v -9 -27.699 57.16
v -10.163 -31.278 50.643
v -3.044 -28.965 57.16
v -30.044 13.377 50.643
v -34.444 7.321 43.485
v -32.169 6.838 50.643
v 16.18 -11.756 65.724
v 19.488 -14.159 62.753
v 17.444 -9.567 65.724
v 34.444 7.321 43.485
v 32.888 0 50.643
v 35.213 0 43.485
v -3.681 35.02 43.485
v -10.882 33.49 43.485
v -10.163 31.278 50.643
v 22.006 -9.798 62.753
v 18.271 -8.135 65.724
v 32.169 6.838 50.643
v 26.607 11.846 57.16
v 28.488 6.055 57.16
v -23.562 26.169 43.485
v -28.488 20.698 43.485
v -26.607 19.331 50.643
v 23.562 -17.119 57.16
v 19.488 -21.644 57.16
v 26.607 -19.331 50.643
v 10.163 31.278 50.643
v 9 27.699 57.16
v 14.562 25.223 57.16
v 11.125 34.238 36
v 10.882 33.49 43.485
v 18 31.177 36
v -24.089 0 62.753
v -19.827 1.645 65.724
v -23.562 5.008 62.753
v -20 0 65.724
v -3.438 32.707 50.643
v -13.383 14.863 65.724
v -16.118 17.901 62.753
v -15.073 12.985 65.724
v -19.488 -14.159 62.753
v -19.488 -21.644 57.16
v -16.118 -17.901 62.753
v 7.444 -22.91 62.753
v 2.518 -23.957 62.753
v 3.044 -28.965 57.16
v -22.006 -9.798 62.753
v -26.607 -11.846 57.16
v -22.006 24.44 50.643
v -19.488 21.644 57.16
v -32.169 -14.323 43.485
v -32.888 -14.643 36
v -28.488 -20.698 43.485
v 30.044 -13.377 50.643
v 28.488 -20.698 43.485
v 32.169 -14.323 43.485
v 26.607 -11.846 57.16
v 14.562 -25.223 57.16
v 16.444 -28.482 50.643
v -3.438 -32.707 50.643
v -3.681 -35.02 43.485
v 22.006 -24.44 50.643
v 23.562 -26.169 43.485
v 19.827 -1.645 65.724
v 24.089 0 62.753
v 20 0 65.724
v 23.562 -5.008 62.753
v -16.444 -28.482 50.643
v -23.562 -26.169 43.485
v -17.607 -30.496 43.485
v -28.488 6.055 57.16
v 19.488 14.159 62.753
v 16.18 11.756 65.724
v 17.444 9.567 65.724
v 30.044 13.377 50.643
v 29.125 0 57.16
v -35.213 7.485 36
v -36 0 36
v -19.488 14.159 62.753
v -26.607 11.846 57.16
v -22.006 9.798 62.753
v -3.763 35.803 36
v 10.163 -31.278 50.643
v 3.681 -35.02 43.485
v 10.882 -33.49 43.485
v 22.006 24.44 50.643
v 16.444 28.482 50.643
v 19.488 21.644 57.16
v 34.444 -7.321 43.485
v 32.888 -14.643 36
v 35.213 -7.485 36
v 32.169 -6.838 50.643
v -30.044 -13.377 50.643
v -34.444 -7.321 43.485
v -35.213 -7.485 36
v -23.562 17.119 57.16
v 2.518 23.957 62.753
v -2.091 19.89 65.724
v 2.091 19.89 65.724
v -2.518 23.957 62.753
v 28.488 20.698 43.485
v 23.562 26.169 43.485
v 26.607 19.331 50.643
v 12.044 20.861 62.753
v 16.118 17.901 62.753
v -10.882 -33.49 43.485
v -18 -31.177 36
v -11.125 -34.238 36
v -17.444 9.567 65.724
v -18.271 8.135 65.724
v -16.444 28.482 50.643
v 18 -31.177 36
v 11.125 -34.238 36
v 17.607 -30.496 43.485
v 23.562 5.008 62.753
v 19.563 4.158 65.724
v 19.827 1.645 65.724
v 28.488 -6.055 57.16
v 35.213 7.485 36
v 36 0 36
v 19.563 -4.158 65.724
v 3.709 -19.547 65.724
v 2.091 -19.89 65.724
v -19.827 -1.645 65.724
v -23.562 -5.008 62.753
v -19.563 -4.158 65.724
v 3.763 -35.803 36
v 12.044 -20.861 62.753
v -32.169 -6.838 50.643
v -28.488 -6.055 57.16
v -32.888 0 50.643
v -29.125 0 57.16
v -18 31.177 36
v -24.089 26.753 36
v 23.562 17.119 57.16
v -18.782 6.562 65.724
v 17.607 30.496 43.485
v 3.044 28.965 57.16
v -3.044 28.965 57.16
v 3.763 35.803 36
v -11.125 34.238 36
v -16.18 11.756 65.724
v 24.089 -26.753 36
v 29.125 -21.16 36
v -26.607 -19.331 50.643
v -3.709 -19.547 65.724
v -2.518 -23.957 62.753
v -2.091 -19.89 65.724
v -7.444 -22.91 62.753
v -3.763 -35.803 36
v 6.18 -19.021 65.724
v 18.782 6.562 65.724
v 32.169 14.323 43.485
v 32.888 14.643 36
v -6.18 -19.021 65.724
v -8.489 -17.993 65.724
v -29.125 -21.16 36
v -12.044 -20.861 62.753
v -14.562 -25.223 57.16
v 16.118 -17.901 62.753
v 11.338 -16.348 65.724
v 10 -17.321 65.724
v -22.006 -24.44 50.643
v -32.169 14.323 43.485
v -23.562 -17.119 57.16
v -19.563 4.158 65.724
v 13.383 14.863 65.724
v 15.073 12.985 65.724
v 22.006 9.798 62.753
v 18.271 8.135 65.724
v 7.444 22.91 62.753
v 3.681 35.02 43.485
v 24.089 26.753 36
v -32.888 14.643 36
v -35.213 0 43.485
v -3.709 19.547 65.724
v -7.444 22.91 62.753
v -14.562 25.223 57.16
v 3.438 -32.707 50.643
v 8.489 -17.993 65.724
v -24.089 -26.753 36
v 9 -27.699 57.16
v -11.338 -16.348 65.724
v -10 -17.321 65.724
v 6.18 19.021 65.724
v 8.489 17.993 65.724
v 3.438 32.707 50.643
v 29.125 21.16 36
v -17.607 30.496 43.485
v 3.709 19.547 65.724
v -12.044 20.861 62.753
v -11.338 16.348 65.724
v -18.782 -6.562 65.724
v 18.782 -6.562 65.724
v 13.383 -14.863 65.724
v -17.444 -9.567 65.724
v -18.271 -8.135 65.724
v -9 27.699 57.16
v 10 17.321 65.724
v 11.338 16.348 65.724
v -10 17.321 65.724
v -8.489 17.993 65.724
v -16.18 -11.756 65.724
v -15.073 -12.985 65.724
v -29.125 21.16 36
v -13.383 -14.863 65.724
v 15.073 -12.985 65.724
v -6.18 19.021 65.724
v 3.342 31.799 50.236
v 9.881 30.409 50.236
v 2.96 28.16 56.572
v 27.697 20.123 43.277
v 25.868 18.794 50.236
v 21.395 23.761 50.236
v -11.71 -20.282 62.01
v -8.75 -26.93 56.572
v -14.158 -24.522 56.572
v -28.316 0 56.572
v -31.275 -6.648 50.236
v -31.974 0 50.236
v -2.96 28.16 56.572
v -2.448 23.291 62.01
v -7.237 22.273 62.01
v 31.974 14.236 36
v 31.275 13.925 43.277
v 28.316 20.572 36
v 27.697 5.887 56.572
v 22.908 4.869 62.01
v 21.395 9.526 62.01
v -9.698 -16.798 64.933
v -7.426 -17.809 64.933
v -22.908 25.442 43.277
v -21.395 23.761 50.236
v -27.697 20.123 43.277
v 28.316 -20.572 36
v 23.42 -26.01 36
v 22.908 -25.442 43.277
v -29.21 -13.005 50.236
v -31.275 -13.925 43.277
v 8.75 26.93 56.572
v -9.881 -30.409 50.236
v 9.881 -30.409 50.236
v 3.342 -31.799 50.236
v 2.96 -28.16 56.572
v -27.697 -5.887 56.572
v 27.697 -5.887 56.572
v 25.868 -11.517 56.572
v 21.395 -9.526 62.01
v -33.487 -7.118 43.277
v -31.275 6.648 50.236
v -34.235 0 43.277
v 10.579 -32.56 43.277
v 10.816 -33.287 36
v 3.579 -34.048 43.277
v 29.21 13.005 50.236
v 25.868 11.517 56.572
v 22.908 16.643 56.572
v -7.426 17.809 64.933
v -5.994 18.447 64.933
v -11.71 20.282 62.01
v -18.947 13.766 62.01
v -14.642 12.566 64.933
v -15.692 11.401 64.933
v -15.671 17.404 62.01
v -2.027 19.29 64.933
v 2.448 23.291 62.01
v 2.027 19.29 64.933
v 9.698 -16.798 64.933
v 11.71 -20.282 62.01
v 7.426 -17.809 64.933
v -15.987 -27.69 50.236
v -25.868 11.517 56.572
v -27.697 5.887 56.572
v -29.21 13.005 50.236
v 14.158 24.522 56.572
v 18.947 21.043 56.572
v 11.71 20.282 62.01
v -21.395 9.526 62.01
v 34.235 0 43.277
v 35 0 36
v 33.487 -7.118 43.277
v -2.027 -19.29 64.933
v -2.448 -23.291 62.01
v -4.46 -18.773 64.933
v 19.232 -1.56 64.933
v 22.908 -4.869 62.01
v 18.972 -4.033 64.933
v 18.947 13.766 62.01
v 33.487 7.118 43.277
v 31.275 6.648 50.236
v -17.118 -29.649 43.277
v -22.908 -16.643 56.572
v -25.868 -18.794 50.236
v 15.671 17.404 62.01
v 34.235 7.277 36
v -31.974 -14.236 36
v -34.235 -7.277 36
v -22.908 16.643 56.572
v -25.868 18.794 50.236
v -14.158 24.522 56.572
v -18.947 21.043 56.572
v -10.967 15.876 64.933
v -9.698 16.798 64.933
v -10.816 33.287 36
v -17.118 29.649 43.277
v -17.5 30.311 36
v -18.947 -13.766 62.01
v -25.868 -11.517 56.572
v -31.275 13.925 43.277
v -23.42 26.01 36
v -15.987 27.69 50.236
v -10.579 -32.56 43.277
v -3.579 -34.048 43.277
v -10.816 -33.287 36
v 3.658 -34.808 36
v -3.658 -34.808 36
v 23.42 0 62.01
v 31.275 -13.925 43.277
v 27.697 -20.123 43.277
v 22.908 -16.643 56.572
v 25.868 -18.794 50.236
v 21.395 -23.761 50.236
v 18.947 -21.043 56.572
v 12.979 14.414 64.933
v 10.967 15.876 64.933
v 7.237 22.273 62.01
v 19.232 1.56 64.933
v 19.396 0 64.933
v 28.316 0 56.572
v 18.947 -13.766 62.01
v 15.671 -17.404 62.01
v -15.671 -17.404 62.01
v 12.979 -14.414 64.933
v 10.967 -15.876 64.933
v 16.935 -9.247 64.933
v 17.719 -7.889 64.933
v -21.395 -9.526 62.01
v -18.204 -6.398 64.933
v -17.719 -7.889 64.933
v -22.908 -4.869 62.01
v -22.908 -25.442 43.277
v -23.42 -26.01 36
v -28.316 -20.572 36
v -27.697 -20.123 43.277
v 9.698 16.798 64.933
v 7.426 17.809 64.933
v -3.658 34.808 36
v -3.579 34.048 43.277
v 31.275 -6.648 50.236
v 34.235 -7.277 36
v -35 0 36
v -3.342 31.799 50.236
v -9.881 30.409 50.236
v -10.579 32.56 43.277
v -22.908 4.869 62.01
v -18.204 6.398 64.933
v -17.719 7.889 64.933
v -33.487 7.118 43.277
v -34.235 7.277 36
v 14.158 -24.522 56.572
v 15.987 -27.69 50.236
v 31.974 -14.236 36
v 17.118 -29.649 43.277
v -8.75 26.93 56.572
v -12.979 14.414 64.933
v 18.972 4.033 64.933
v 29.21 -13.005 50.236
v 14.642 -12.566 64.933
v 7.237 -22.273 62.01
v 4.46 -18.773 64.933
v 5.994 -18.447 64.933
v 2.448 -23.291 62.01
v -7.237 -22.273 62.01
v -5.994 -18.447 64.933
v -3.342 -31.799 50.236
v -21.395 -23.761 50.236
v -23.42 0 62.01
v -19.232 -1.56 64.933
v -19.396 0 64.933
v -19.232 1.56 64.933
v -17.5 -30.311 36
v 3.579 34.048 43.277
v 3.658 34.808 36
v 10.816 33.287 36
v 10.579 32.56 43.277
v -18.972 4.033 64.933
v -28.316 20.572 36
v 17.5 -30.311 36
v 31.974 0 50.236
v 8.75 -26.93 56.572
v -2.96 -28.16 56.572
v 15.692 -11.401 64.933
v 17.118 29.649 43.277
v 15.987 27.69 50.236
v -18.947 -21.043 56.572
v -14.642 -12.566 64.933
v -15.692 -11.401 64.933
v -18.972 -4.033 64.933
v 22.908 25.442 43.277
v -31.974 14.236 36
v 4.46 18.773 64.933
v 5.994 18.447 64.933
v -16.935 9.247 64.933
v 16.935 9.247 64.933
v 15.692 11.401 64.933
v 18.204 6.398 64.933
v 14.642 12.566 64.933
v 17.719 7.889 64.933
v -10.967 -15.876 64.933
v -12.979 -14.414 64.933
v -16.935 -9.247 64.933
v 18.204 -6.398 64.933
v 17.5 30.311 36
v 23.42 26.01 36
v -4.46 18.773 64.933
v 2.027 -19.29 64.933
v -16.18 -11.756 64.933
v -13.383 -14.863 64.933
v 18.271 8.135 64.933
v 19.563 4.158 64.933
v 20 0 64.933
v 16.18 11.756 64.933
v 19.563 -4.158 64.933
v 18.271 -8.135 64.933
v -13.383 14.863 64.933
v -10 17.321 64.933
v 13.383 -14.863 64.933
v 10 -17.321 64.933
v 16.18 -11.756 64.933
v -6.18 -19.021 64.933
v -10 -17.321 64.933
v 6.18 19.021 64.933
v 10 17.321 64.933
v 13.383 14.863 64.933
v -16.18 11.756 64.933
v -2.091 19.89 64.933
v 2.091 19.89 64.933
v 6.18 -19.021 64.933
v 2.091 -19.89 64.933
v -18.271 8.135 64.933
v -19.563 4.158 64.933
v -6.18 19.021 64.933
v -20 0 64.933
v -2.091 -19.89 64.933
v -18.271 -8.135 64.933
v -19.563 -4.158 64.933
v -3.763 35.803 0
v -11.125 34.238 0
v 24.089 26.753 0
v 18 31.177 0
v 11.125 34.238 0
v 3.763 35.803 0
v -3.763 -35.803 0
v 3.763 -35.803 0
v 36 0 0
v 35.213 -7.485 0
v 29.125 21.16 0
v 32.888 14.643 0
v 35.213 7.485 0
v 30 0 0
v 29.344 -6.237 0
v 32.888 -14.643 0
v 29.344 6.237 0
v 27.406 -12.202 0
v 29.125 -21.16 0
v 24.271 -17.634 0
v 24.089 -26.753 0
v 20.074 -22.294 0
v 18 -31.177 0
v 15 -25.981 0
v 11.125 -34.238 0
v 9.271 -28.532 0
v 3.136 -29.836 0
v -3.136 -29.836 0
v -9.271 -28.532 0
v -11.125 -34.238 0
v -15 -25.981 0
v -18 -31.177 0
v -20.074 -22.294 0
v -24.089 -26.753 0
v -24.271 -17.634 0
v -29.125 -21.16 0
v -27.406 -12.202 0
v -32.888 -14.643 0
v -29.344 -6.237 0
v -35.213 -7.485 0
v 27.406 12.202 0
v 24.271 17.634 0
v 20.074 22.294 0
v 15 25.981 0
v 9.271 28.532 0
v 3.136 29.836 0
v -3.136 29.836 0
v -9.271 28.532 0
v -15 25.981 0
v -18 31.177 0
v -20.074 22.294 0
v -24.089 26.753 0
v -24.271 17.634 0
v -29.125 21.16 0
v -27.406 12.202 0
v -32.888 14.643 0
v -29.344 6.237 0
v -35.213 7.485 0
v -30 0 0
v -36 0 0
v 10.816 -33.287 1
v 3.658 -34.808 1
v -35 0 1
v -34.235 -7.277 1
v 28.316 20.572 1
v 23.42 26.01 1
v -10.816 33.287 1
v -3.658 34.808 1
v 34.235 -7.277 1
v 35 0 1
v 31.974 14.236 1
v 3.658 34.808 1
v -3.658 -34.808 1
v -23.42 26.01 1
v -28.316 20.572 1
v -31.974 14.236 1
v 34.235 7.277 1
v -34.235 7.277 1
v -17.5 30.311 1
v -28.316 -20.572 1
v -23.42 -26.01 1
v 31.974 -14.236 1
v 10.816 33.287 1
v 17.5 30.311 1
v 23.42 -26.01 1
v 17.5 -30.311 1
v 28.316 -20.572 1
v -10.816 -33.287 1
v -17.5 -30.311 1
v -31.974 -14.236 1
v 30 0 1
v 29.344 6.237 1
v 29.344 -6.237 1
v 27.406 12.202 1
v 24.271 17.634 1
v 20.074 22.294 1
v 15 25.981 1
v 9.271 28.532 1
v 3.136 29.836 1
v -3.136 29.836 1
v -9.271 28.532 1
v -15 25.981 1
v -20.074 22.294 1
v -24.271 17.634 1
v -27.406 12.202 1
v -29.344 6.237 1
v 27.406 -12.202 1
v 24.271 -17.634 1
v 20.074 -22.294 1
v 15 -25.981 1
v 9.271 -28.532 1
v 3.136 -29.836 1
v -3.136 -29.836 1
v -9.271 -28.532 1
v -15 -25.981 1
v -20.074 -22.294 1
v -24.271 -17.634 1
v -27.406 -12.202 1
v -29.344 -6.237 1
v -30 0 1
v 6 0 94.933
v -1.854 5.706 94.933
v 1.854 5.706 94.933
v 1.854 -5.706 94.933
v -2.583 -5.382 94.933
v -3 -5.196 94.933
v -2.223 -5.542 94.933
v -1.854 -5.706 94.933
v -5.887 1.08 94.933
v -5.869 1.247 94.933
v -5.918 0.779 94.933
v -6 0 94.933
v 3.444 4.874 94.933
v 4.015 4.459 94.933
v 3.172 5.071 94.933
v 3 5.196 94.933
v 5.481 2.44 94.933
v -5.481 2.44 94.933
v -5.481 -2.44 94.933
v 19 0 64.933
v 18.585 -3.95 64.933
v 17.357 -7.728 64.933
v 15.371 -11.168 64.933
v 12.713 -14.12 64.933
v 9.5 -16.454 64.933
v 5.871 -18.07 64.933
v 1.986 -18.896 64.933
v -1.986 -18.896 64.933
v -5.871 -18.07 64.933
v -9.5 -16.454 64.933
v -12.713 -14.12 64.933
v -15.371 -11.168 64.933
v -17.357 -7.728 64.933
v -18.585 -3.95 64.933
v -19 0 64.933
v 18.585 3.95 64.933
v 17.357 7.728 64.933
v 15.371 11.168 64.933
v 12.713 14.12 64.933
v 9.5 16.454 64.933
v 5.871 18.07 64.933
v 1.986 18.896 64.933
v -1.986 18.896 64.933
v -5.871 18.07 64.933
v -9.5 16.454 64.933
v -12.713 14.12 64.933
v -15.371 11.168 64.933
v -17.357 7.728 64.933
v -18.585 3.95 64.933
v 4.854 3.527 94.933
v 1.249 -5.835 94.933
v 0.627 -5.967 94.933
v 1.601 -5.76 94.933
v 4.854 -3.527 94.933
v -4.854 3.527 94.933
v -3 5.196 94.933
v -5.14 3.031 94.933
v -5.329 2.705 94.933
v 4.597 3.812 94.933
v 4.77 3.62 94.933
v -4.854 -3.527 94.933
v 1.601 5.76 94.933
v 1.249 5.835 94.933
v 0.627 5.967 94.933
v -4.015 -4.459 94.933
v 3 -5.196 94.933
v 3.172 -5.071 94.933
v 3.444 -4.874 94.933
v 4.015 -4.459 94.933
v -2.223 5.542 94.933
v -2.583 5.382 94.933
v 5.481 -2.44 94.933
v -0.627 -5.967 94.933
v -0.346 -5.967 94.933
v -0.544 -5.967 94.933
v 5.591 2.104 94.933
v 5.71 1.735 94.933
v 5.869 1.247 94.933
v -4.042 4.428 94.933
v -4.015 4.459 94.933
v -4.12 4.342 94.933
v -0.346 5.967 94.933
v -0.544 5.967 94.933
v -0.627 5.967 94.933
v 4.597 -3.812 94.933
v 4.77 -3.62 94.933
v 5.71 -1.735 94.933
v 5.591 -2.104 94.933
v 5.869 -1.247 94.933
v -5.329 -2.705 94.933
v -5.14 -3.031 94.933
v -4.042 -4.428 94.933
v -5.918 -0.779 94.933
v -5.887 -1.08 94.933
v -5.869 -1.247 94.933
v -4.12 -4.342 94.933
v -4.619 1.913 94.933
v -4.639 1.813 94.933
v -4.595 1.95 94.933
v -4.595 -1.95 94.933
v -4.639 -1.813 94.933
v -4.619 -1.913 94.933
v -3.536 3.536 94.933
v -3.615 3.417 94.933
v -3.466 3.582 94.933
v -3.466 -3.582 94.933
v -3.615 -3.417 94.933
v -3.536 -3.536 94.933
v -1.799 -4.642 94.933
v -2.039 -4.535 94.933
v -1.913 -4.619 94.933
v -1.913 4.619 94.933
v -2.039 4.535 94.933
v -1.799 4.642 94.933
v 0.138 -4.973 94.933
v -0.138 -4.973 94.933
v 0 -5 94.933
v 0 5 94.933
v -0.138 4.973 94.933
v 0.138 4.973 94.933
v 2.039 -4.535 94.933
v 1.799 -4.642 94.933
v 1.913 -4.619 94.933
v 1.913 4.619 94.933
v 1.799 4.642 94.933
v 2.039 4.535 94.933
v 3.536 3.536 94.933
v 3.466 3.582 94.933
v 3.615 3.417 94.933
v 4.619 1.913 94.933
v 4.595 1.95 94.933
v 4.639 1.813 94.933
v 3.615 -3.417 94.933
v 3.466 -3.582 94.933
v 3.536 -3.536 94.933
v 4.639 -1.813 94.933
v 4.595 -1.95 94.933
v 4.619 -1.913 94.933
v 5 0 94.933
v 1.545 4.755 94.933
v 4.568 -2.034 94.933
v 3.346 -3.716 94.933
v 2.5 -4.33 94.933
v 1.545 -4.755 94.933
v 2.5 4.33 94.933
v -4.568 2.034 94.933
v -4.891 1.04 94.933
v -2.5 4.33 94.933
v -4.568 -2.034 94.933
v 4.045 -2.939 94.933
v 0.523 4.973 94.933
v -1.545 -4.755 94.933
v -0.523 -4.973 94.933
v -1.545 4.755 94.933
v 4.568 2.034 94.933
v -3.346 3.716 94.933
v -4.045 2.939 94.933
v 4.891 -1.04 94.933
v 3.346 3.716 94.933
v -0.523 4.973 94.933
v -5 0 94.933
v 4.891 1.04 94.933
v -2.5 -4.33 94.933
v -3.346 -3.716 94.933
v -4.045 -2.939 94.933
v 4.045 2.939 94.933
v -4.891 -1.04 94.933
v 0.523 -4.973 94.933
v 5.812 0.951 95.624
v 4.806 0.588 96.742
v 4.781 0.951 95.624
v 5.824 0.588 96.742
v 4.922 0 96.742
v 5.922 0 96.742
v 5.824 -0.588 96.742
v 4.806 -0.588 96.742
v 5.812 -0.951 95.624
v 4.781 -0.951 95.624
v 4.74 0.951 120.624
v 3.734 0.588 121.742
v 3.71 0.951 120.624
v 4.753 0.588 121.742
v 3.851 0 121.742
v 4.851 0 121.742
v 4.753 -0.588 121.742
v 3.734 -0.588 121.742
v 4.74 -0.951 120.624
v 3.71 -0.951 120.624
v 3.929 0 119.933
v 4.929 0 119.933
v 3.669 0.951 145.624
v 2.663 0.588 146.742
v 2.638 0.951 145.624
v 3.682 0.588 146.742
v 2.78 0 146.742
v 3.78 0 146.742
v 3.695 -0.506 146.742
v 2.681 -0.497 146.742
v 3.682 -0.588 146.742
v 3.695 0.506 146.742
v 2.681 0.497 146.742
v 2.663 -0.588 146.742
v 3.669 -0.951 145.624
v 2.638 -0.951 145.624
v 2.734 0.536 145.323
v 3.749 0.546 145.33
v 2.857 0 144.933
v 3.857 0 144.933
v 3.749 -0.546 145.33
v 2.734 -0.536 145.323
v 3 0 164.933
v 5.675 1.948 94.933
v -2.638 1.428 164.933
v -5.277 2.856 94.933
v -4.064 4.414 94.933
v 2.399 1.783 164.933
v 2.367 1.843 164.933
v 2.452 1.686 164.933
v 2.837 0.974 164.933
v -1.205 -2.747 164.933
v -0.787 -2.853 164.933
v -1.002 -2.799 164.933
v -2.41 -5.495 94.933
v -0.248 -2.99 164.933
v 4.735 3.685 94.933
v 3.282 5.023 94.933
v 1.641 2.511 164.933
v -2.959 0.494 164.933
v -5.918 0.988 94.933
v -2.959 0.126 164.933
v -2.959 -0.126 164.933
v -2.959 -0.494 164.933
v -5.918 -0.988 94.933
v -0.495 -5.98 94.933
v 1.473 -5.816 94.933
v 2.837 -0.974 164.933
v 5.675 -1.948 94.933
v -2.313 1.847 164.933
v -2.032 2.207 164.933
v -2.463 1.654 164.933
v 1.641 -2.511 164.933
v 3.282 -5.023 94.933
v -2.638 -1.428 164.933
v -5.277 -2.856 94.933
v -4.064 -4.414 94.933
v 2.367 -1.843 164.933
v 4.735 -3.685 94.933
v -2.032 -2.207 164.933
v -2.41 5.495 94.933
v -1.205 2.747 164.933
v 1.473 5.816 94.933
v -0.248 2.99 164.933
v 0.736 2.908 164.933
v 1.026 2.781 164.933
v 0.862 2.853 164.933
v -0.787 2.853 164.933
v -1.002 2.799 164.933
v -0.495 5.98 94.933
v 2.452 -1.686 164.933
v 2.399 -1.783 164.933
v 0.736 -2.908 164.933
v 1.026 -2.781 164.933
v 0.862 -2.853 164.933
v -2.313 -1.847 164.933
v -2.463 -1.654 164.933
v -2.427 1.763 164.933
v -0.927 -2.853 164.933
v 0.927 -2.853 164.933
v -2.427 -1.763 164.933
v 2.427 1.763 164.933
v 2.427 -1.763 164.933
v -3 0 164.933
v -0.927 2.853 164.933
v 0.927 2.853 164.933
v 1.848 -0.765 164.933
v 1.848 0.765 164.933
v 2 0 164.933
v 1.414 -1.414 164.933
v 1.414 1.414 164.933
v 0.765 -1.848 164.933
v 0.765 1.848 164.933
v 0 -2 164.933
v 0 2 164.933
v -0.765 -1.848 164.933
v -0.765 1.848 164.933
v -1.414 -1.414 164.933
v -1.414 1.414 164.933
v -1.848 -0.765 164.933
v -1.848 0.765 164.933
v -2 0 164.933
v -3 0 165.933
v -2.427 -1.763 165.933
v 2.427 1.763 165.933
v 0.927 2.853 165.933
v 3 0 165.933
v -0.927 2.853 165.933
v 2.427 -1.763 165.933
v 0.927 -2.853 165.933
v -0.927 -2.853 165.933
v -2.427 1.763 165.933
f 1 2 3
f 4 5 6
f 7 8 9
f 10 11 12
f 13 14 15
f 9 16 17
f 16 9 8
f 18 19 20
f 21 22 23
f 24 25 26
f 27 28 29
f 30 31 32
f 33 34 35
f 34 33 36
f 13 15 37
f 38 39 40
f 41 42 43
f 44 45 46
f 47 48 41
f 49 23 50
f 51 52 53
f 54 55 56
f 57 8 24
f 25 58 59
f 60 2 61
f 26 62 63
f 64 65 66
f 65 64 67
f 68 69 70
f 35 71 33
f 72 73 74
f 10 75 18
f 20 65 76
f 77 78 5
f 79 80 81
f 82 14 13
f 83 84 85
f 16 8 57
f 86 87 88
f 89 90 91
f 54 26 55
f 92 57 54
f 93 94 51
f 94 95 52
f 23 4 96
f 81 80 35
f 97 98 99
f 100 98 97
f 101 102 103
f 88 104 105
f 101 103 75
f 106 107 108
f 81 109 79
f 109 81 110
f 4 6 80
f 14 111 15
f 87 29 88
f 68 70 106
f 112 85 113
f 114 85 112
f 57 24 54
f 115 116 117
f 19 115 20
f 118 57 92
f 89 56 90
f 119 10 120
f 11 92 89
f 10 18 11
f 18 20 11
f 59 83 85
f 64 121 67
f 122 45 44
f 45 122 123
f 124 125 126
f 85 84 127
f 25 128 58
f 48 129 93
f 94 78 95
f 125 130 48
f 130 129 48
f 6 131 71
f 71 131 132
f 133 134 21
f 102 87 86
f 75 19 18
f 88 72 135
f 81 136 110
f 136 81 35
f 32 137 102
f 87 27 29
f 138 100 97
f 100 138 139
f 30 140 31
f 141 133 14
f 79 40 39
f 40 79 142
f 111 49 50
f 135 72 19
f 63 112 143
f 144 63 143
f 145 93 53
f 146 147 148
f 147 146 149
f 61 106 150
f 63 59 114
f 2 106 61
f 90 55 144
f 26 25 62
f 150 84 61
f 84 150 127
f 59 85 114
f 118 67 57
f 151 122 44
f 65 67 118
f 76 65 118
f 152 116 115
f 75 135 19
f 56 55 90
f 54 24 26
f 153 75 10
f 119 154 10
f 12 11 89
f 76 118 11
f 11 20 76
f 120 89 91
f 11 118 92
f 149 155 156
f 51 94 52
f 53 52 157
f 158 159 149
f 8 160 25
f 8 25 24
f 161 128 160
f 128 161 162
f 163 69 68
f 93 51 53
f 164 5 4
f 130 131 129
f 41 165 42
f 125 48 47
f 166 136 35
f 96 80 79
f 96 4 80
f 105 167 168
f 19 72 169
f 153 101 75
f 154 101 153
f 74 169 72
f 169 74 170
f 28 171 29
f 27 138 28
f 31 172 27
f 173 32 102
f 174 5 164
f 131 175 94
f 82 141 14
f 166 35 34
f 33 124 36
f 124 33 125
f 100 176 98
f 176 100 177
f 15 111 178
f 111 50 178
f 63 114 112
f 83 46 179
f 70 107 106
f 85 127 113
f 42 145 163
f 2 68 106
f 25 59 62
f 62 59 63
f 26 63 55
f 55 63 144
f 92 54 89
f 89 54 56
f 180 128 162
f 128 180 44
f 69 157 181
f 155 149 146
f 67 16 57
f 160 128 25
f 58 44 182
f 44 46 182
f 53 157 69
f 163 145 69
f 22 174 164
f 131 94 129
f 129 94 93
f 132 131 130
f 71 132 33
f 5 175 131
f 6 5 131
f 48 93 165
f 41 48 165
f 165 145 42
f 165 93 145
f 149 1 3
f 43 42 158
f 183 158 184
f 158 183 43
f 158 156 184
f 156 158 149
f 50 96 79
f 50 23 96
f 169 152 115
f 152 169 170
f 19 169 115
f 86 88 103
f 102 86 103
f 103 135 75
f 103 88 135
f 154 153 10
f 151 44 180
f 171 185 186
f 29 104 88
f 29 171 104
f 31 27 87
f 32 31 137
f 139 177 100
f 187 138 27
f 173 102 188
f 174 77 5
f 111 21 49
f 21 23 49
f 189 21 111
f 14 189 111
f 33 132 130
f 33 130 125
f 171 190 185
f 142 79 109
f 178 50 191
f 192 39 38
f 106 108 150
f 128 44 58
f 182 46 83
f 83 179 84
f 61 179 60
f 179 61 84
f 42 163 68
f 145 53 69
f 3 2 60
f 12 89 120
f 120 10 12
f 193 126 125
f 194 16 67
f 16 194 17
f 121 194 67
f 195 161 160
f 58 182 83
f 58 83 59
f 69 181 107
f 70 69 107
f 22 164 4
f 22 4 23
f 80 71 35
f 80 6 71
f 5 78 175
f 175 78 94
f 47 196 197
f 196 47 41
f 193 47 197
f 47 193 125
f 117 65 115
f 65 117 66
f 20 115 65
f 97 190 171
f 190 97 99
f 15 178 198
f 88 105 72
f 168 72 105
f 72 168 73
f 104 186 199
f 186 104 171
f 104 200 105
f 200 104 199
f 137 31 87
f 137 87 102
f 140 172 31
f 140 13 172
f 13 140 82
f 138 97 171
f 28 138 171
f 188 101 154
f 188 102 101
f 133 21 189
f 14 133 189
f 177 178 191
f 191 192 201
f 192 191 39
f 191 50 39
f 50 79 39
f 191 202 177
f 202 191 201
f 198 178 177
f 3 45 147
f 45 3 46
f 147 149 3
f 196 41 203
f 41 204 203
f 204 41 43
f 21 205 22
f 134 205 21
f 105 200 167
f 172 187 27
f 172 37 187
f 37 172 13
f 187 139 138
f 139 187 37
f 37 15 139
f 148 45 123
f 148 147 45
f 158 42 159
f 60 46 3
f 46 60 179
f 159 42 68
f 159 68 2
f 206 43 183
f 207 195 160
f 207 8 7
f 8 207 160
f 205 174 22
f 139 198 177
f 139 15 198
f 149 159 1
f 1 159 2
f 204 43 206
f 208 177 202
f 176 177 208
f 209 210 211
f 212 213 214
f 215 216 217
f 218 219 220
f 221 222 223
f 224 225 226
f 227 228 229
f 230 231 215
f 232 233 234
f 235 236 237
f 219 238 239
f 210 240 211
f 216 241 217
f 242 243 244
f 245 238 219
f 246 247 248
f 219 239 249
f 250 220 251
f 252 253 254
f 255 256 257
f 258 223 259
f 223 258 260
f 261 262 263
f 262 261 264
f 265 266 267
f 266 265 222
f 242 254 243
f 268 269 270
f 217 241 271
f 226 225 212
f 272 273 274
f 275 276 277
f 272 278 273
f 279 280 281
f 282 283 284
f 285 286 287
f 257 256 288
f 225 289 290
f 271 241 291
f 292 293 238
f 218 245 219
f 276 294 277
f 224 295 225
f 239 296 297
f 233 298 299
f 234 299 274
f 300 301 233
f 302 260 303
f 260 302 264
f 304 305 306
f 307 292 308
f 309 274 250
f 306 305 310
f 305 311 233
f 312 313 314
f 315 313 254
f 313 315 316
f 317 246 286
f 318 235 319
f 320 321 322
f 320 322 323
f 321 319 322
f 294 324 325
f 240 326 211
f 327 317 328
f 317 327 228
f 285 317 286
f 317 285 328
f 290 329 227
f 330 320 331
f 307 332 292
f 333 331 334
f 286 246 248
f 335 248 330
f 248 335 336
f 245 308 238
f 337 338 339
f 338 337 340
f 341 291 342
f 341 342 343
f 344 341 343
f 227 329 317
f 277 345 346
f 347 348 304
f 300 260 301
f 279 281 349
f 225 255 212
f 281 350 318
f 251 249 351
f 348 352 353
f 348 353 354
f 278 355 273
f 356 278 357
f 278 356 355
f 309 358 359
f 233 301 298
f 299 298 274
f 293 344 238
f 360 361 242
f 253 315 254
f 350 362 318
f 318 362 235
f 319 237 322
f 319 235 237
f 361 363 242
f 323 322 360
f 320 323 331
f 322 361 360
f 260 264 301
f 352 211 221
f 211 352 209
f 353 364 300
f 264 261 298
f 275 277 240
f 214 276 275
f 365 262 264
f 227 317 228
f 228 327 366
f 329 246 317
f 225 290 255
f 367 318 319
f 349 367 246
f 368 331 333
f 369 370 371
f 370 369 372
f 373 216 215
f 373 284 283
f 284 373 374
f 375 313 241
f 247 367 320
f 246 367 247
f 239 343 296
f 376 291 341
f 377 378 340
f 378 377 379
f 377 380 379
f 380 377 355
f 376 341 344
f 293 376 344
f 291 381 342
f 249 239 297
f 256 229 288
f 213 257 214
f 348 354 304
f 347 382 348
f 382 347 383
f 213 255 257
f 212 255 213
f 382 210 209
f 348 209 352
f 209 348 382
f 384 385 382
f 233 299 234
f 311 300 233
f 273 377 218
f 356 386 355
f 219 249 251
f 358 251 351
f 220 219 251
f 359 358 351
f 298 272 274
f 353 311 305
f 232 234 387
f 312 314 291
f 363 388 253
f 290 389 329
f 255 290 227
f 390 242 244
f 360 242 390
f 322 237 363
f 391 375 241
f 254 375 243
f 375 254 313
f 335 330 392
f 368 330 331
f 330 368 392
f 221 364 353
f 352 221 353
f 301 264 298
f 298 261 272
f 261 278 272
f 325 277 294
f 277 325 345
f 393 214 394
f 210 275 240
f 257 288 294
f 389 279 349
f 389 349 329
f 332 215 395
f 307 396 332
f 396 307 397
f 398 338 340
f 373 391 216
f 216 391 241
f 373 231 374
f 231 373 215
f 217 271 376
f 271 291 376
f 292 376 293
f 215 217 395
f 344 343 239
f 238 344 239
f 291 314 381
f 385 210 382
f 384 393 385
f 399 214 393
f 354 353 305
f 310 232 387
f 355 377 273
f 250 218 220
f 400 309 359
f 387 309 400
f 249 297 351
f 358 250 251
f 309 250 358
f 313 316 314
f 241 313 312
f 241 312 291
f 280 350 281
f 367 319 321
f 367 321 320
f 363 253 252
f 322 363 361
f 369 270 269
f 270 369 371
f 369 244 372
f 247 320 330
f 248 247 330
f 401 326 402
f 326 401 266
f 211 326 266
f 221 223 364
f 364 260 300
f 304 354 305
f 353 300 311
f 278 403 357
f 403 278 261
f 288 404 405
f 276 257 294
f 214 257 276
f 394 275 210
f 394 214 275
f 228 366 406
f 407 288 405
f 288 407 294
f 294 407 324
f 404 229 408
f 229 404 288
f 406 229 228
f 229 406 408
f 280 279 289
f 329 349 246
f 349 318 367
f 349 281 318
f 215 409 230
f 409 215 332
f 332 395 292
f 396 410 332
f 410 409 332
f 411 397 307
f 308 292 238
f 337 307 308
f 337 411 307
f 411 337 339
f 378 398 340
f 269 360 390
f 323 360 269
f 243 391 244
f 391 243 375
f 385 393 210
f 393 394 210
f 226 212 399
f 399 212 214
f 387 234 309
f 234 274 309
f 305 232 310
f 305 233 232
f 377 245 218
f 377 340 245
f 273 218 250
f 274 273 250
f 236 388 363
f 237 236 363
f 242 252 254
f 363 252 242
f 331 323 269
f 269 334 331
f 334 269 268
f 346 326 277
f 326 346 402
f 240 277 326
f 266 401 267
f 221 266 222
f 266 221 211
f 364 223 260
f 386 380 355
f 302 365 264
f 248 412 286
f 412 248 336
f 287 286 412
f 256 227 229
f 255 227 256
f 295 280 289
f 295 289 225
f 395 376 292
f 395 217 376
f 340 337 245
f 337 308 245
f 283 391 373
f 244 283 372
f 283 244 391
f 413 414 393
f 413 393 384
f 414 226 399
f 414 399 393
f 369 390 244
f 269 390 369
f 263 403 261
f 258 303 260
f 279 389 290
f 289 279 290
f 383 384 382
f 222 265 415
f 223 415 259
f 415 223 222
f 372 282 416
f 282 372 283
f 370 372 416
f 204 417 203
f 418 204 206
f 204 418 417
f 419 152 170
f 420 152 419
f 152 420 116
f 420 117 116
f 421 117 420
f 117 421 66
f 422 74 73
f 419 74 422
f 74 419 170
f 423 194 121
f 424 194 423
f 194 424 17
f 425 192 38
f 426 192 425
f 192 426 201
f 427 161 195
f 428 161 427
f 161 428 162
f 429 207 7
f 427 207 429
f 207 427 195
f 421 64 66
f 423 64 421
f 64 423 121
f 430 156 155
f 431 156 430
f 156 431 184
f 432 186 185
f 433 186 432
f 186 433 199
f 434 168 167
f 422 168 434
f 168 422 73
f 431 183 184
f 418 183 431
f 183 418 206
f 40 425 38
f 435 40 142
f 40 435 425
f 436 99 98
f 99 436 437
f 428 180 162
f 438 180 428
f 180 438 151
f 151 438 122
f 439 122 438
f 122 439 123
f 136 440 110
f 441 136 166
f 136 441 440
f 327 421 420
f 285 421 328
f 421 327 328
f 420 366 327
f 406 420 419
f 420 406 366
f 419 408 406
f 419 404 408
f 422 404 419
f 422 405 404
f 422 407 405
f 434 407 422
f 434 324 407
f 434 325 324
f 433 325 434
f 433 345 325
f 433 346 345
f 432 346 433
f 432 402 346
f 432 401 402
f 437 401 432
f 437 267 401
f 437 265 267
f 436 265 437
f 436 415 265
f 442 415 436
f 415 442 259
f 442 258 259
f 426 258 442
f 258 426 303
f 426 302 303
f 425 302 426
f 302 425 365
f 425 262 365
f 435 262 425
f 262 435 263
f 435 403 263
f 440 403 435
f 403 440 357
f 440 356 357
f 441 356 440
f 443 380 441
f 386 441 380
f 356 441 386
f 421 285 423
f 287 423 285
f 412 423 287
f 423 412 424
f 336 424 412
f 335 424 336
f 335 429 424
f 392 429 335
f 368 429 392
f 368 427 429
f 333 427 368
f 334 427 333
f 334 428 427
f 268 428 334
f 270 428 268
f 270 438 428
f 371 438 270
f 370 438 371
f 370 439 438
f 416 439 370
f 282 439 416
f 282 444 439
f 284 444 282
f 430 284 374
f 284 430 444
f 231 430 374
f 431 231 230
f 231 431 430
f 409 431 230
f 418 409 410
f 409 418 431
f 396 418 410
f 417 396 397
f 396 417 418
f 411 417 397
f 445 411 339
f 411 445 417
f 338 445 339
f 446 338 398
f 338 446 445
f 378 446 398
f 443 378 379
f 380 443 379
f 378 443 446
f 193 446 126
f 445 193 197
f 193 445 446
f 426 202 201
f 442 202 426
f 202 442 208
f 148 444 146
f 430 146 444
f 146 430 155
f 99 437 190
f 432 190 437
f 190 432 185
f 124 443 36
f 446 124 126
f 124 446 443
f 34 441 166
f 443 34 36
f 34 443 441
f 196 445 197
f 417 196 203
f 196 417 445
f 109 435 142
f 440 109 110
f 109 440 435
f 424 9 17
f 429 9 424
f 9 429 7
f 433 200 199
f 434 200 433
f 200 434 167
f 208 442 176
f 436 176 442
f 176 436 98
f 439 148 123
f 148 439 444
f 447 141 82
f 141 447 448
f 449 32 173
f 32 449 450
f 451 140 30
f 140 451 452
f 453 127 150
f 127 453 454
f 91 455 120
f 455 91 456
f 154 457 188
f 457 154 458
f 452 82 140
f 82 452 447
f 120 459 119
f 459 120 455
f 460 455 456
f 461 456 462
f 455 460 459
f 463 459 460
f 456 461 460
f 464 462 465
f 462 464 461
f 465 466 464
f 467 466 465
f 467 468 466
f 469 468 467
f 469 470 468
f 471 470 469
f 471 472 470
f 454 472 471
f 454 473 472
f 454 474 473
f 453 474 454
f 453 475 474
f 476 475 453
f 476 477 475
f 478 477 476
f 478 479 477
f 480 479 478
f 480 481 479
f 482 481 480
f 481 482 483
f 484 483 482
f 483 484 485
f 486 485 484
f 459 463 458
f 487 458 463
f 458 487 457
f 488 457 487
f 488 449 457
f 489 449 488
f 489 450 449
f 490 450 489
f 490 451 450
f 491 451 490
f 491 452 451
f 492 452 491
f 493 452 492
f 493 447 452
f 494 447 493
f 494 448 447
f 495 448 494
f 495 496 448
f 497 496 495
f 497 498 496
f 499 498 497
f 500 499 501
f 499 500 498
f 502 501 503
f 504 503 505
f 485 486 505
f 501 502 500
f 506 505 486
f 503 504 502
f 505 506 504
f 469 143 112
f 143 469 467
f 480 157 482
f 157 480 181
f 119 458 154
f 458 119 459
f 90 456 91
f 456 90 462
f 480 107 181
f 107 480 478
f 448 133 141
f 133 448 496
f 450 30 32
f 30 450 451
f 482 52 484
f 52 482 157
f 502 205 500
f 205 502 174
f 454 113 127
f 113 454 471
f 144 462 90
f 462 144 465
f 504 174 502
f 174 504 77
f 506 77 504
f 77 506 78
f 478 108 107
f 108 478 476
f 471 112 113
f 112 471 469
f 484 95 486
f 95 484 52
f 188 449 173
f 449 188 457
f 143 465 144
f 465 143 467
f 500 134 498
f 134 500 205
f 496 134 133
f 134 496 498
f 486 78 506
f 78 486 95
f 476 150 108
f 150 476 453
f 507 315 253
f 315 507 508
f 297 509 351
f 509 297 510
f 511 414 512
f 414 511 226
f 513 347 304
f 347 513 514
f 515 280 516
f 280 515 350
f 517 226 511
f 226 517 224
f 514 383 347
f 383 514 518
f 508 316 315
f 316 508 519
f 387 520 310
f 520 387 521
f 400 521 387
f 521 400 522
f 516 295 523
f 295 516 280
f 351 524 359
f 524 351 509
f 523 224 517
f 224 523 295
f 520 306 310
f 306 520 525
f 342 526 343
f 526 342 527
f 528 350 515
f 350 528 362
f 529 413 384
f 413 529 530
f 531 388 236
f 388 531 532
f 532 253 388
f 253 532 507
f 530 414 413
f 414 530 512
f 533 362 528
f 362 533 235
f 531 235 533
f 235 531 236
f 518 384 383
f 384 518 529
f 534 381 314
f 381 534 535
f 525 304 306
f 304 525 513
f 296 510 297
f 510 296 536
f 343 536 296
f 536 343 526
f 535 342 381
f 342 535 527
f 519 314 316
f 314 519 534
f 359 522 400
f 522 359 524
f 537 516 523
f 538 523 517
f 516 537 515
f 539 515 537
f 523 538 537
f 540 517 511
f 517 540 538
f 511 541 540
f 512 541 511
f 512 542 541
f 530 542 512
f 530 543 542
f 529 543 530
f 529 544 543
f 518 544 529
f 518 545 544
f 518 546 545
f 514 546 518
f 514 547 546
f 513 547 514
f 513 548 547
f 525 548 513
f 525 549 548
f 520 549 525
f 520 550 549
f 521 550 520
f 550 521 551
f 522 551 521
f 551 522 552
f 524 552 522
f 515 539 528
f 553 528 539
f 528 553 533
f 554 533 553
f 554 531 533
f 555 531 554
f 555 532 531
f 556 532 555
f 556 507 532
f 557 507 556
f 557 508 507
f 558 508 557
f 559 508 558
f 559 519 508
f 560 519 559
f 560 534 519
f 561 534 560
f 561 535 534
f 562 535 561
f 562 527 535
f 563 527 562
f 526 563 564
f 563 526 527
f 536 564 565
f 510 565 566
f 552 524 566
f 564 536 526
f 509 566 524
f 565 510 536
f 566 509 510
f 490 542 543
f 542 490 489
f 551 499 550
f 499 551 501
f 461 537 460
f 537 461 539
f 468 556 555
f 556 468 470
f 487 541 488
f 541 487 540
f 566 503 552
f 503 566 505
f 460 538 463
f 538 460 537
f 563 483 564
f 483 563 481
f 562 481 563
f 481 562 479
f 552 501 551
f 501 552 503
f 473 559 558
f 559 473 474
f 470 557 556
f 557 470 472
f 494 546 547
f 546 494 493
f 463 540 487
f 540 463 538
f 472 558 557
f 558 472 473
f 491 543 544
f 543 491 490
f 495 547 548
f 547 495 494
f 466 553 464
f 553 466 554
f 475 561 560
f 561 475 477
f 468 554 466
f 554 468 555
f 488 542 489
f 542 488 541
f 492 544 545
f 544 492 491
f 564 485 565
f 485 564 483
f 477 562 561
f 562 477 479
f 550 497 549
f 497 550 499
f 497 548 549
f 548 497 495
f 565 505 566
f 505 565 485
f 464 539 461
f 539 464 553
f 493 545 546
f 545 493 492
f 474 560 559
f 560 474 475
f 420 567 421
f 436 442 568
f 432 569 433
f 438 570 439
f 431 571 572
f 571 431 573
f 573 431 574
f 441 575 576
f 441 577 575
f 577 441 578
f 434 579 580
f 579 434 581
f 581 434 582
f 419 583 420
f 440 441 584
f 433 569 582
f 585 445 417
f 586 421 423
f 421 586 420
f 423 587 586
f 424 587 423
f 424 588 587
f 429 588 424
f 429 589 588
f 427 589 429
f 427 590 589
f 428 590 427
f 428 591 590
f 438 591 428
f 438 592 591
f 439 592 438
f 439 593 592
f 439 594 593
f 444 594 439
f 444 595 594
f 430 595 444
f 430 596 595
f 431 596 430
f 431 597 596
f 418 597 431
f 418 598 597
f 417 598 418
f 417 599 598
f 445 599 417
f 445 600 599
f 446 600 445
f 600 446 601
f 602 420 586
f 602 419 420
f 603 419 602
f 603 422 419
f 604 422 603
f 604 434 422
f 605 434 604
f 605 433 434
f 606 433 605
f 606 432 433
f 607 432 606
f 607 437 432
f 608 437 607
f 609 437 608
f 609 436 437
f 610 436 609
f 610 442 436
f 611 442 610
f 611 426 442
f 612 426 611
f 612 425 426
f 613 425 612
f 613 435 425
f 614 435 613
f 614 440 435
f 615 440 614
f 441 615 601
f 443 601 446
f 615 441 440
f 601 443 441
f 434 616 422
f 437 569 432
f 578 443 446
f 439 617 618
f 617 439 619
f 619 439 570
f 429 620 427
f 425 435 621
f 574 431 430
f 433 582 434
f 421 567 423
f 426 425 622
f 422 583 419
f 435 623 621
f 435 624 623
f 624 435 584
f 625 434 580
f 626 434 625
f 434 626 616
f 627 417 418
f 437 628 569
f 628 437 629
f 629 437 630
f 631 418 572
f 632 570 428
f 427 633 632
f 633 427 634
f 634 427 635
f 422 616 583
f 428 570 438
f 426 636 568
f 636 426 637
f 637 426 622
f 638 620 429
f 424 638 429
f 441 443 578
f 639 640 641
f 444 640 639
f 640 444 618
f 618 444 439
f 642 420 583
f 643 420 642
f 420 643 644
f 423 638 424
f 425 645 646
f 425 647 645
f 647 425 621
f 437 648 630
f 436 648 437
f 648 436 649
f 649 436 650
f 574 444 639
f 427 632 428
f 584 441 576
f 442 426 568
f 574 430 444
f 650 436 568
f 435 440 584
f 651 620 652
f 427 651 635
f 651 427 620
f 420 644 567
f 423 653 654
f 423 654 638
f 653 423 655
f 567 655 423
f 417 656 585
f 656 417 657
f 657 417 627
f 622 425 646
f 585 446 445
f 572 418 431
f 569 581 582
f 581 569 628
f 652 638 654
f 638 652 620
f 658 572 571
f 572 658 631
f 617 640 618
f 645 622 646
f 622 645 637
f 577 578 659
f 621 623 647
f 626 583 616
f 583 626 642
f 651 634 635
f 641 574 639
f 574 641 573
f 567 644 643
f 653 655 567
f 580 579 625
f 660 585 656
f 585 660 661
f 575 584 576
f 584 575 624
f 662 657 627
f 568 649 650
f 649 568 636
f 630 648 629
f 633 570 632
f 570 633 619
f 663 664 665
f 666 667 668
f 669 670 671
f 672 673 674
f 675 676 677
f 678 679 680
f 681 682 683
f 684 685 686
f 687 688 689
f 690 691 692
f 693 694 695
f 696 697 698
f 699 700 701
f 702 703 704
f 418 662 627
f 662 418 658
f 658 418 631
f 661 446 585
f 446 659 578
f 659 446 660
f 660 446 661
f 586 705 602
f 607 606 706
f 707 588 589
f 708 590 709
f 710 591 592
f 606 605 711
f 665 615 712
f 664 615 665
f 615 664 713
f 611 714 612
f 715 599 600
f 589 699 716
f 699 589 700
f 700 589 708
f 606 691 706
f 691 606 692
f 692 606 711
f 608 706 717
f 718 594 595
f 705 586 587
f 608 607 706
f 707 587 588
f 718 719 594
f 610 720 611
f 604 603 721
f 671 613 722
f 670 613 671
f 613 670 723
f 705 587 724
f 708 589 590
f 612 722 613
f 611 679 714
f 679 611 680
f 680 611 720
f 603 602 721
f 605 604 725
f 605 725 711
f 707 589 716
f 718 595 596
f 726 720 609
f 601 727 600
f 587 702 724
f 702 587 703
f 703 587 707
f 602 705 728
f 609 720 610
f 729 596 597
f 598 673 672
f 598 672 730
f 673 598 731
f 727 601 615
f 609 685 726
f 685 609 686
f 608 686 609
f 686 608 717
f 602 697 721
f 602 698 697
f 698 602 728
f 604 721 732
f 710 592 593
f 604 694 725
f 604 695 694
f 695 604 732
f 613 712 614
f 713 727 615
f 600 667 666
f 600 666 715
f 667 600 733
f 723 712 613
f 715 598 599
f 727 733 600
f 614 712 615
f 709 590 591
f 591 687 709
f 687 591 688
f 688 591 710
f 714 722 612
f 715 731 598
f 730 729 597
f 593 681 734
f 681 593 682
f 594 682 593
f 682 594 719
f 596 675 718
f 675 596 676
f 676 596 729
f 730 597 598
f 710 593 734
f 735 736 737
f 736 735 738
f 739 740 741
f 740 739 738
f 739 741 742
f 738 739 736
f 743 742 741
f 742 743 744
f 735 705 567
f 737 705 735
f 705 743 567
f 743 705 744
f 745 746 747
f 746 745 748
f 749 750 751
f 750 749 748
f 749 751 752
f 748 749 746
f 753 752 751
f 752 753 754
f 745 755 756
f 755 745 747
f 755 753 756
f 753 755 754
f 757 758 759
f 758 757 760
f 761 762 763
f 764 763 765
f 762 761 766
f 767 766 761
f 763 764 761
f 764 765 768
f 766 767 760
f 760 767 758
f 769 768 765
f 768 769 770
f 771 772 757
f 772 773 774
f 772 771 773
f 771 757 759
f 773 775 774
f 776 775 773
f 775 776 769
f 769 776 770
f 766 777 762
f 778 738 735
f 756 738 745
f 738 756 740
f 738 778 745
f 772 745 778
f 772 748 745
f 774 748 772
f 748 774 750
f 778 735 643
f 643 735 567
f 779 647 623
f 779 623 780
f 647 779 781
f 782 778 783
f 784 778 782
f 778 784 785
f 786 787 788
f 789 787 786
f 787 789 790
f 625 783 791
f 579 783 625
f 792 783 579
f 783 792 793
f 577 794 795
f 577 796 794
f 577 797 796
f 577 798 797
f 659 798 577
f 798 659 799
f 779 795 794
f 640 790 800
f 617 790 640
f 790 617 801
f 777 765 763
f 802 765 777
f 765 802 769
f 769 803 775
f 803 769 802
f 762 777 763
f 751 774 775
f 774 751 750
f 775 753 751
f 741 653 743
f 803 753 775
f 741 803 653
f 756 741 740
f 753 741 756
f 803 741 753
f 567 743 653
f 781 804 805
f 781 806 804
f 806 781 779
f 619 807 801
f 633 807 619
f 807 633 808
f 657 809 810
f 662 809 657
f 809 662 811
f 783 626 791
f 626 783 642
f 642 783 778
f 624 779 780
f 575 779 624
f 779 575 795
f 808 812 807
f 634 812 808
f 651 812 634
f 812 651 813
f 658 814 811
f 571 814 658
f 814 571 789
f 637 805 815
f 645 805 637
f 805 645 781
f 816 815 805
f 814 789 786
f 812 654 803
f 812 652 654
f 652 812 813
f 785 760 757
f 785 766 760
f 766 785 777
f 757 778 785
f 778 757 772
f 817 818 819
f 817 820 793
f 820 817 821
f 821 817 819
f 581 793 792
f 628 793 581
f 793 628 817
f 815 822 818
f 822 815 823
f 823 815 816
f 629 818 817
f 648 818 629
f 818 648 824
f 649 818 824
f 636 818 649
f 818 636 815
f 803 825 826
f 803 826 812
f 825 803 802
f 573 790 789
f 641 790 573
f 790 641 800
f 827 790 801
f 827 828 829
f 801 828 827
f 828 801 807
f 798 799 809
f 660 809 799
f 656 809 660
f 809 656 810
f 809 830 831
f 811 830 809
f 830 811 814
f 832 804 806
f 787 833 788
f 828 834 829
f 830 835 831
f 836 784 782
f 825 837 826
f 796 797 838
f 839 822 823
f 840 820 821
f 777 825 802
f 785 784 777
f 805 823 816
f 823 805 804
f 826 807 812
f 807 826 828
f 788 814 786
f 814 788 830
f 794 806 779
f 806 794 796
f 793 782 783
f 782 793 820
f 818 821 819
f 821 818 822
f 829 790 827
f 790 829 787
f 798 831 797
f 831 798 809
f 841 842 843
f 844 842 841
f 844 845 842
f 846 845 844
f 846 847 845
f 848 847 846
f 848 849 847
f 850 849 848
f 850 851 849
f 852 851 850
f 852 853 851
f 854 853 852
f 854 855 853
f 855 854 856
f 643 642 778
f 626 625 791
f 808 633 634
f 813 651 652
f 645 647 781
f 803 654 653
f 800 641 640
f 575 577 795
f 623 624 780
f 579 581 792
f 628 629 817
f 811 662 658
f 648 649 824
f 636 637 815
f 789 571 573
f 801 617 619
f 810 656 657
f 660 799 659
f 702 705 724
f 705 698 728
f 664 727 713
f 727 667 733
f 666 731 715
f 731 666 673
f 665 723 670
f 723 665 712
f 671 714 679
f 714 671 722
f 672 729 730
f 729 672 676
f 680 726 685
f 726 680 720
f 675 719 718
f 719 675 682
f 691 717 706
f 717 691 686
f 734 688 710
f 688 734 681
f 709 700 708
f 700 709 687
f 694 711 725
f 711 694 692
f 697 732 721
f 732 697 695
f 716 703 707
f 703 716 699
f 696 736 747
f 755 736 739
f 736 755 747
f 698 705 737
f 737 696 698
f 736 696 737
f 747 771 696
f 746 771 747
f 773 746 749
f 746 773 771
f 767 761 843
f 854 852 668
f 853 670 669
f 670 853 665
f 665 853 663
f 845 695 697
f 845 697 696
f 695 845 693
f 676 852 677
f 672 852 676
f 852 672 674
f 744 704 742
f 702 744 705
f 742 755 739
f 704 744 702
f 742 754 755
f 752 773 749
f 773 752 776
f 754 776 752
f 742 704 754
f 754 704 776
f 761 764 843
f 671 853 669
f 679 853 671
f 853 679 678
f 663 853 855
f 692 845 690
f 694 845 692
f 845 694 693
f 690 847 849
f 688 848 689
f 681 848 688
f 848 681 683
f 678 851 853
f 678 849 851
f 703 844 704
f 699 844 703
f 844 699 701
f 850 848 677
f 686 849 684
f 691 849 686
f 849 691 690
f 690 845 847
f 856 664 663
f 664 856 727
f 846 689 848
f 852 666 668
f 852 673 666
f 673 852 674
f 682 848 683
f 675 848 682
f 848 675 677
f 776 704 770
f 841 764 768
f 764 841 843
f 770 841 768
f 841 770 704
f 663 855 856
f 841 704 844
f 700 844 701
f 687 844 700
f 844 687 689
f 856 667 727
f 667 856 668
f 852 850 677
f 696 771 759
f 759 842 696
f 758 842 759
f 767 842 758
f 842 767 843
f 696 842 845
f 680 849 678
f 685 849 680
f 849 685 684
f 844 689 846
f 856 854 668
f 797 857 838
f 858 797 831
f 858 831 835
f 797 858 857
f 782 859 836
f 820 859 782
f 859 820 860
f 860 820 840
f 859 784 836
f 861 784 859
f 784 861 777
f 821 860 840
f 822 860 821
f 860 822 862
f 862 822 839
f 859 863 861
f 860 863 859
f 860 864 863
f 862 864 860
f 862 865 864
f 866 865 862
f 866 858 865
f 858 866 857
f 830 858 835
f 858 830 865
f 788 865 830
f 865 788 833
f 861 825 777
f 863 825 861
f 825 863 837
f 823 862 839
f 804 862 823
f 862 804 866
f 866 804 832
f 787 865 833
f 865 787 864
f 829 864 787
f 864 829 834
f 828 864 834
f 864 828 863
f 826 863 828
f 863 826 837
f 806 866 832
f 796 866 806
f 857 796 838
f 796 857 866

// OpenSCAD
thickness = 1.0;

// Dimensions of main water tank
tank_radius = 36.0;
tank_lip = 6.0;

// Dimensions of pipe for main water tank
pipe_length = 30;
pipe_radius = 20;
pipe_min_radius = 6;

// Dimensions of spout
spout_length = 70;
spout_hole_radius = 1.0;
spout_min_radius = 3;
spout_hole_every = 25;

// Height at which pipe intersects with main water tank
intersection_height = sqrt(pow(tank_radius, 2) - pow(pipe_radius, 2));

// Dimensions of cap for main water tank
cap_height = 8;

module draw_spike() {
    translate([0, 0, tank_radius]) {
            draw_tank();
    translate([0, 0, intersection_height - thickness])
        draw_pipe();
    translate([0, 0, intersection_height + pipe_length - thickness])
        draw_spout();
    }
}

draw_spike();
//draw_cap();

// Draw Tank
module draw_tank() {
    difference() {
        sphere(r = tank_radius);
        sphere(r = tank_radius - thickness);
        
        // Crop out area above pipe connection
        translate([0, 0, intersection_height - thickness])
            cylinder(h = tank_radius, r = pipe_radius);
        
        // Crop out area below cylinder connection
        translate([0, 0, -tank_radius / 2])
            cube([2 * tank_radius, 2 * tank_radius, tank_radius], true);
    }
    
    // Draw the cylinder
    translate([0, 0, -tank_radius])
        difference() {
            cylinder(h = tank_radius, r = tank_radius);
            cylinder(h = tank_radius, r = tank_radius - thickness);
        }
        
    // Draw the lip
    translate([0, 0, -tank_radius])
        difference() {
            cylinder(h = thickness, r = tank_radius);
            cylinder(h = thickness, r = tank_radius - tank_lip);
        }
}

// Draw pipe
module draw_pipe() {
    difference() {
        cylinder(h = pipe_length, r1 = pipe_radius, r2 = pipe_min_radius);
        cylinder(h = pipe_length, r1 = pipe_radius - thickness, r2 = pipe_min_radius - thickness);
    }
}

// Draw spout
module draw_spout() {
    difference() {
        cylinder(h = spout_length, r1 = pipe_min_radius, r2 = spout_min_radius);
        cylinder(h = spout_length, r1 = pipe_min_radius - thickness, r2 = spout_min_radius - thickness);
        
        // Cut out water-flow holes
        for (this_hole_z = [spout_hole_radius:spout_hole_every:spout_length-spout_hole_radius]) {
            translate([0, 0, this_hole_z])
                rotate([0, 90, 0])
                    cylinder(h = pipe_radius, r = spout_hole_radius);
        }
    }
    
    // Seal top of spout
    translate([0, 0, spout_length])
        cylinder(h = thickness, r = spout_min_radius);
}

// Draw cap
module draw_cap() {
    union() {
        cylinder(h = thickness, r = tank_radius + thickness);
        difference() {
            cylinder(h = cap_height, r = tank_radius + thickness);
            cylinder(h = cap_height, r = tank_radius);
        }
    }
}


// V = (4 /3 ) * PI * r^3
volume_sphere = 4 / 3 * 3.14159265358595 * tank_radius * tank_radius * tank_radius / 2;
// V = PI * r^2 * h
volume_cylinder = 3.14159265358595 * tank_radius * tank_radius * tank_radius;
volume_oz = (volume_sphere + volume_cylinder) / 29573.5;
echo("Volume: ", volume_oz, " oz");
